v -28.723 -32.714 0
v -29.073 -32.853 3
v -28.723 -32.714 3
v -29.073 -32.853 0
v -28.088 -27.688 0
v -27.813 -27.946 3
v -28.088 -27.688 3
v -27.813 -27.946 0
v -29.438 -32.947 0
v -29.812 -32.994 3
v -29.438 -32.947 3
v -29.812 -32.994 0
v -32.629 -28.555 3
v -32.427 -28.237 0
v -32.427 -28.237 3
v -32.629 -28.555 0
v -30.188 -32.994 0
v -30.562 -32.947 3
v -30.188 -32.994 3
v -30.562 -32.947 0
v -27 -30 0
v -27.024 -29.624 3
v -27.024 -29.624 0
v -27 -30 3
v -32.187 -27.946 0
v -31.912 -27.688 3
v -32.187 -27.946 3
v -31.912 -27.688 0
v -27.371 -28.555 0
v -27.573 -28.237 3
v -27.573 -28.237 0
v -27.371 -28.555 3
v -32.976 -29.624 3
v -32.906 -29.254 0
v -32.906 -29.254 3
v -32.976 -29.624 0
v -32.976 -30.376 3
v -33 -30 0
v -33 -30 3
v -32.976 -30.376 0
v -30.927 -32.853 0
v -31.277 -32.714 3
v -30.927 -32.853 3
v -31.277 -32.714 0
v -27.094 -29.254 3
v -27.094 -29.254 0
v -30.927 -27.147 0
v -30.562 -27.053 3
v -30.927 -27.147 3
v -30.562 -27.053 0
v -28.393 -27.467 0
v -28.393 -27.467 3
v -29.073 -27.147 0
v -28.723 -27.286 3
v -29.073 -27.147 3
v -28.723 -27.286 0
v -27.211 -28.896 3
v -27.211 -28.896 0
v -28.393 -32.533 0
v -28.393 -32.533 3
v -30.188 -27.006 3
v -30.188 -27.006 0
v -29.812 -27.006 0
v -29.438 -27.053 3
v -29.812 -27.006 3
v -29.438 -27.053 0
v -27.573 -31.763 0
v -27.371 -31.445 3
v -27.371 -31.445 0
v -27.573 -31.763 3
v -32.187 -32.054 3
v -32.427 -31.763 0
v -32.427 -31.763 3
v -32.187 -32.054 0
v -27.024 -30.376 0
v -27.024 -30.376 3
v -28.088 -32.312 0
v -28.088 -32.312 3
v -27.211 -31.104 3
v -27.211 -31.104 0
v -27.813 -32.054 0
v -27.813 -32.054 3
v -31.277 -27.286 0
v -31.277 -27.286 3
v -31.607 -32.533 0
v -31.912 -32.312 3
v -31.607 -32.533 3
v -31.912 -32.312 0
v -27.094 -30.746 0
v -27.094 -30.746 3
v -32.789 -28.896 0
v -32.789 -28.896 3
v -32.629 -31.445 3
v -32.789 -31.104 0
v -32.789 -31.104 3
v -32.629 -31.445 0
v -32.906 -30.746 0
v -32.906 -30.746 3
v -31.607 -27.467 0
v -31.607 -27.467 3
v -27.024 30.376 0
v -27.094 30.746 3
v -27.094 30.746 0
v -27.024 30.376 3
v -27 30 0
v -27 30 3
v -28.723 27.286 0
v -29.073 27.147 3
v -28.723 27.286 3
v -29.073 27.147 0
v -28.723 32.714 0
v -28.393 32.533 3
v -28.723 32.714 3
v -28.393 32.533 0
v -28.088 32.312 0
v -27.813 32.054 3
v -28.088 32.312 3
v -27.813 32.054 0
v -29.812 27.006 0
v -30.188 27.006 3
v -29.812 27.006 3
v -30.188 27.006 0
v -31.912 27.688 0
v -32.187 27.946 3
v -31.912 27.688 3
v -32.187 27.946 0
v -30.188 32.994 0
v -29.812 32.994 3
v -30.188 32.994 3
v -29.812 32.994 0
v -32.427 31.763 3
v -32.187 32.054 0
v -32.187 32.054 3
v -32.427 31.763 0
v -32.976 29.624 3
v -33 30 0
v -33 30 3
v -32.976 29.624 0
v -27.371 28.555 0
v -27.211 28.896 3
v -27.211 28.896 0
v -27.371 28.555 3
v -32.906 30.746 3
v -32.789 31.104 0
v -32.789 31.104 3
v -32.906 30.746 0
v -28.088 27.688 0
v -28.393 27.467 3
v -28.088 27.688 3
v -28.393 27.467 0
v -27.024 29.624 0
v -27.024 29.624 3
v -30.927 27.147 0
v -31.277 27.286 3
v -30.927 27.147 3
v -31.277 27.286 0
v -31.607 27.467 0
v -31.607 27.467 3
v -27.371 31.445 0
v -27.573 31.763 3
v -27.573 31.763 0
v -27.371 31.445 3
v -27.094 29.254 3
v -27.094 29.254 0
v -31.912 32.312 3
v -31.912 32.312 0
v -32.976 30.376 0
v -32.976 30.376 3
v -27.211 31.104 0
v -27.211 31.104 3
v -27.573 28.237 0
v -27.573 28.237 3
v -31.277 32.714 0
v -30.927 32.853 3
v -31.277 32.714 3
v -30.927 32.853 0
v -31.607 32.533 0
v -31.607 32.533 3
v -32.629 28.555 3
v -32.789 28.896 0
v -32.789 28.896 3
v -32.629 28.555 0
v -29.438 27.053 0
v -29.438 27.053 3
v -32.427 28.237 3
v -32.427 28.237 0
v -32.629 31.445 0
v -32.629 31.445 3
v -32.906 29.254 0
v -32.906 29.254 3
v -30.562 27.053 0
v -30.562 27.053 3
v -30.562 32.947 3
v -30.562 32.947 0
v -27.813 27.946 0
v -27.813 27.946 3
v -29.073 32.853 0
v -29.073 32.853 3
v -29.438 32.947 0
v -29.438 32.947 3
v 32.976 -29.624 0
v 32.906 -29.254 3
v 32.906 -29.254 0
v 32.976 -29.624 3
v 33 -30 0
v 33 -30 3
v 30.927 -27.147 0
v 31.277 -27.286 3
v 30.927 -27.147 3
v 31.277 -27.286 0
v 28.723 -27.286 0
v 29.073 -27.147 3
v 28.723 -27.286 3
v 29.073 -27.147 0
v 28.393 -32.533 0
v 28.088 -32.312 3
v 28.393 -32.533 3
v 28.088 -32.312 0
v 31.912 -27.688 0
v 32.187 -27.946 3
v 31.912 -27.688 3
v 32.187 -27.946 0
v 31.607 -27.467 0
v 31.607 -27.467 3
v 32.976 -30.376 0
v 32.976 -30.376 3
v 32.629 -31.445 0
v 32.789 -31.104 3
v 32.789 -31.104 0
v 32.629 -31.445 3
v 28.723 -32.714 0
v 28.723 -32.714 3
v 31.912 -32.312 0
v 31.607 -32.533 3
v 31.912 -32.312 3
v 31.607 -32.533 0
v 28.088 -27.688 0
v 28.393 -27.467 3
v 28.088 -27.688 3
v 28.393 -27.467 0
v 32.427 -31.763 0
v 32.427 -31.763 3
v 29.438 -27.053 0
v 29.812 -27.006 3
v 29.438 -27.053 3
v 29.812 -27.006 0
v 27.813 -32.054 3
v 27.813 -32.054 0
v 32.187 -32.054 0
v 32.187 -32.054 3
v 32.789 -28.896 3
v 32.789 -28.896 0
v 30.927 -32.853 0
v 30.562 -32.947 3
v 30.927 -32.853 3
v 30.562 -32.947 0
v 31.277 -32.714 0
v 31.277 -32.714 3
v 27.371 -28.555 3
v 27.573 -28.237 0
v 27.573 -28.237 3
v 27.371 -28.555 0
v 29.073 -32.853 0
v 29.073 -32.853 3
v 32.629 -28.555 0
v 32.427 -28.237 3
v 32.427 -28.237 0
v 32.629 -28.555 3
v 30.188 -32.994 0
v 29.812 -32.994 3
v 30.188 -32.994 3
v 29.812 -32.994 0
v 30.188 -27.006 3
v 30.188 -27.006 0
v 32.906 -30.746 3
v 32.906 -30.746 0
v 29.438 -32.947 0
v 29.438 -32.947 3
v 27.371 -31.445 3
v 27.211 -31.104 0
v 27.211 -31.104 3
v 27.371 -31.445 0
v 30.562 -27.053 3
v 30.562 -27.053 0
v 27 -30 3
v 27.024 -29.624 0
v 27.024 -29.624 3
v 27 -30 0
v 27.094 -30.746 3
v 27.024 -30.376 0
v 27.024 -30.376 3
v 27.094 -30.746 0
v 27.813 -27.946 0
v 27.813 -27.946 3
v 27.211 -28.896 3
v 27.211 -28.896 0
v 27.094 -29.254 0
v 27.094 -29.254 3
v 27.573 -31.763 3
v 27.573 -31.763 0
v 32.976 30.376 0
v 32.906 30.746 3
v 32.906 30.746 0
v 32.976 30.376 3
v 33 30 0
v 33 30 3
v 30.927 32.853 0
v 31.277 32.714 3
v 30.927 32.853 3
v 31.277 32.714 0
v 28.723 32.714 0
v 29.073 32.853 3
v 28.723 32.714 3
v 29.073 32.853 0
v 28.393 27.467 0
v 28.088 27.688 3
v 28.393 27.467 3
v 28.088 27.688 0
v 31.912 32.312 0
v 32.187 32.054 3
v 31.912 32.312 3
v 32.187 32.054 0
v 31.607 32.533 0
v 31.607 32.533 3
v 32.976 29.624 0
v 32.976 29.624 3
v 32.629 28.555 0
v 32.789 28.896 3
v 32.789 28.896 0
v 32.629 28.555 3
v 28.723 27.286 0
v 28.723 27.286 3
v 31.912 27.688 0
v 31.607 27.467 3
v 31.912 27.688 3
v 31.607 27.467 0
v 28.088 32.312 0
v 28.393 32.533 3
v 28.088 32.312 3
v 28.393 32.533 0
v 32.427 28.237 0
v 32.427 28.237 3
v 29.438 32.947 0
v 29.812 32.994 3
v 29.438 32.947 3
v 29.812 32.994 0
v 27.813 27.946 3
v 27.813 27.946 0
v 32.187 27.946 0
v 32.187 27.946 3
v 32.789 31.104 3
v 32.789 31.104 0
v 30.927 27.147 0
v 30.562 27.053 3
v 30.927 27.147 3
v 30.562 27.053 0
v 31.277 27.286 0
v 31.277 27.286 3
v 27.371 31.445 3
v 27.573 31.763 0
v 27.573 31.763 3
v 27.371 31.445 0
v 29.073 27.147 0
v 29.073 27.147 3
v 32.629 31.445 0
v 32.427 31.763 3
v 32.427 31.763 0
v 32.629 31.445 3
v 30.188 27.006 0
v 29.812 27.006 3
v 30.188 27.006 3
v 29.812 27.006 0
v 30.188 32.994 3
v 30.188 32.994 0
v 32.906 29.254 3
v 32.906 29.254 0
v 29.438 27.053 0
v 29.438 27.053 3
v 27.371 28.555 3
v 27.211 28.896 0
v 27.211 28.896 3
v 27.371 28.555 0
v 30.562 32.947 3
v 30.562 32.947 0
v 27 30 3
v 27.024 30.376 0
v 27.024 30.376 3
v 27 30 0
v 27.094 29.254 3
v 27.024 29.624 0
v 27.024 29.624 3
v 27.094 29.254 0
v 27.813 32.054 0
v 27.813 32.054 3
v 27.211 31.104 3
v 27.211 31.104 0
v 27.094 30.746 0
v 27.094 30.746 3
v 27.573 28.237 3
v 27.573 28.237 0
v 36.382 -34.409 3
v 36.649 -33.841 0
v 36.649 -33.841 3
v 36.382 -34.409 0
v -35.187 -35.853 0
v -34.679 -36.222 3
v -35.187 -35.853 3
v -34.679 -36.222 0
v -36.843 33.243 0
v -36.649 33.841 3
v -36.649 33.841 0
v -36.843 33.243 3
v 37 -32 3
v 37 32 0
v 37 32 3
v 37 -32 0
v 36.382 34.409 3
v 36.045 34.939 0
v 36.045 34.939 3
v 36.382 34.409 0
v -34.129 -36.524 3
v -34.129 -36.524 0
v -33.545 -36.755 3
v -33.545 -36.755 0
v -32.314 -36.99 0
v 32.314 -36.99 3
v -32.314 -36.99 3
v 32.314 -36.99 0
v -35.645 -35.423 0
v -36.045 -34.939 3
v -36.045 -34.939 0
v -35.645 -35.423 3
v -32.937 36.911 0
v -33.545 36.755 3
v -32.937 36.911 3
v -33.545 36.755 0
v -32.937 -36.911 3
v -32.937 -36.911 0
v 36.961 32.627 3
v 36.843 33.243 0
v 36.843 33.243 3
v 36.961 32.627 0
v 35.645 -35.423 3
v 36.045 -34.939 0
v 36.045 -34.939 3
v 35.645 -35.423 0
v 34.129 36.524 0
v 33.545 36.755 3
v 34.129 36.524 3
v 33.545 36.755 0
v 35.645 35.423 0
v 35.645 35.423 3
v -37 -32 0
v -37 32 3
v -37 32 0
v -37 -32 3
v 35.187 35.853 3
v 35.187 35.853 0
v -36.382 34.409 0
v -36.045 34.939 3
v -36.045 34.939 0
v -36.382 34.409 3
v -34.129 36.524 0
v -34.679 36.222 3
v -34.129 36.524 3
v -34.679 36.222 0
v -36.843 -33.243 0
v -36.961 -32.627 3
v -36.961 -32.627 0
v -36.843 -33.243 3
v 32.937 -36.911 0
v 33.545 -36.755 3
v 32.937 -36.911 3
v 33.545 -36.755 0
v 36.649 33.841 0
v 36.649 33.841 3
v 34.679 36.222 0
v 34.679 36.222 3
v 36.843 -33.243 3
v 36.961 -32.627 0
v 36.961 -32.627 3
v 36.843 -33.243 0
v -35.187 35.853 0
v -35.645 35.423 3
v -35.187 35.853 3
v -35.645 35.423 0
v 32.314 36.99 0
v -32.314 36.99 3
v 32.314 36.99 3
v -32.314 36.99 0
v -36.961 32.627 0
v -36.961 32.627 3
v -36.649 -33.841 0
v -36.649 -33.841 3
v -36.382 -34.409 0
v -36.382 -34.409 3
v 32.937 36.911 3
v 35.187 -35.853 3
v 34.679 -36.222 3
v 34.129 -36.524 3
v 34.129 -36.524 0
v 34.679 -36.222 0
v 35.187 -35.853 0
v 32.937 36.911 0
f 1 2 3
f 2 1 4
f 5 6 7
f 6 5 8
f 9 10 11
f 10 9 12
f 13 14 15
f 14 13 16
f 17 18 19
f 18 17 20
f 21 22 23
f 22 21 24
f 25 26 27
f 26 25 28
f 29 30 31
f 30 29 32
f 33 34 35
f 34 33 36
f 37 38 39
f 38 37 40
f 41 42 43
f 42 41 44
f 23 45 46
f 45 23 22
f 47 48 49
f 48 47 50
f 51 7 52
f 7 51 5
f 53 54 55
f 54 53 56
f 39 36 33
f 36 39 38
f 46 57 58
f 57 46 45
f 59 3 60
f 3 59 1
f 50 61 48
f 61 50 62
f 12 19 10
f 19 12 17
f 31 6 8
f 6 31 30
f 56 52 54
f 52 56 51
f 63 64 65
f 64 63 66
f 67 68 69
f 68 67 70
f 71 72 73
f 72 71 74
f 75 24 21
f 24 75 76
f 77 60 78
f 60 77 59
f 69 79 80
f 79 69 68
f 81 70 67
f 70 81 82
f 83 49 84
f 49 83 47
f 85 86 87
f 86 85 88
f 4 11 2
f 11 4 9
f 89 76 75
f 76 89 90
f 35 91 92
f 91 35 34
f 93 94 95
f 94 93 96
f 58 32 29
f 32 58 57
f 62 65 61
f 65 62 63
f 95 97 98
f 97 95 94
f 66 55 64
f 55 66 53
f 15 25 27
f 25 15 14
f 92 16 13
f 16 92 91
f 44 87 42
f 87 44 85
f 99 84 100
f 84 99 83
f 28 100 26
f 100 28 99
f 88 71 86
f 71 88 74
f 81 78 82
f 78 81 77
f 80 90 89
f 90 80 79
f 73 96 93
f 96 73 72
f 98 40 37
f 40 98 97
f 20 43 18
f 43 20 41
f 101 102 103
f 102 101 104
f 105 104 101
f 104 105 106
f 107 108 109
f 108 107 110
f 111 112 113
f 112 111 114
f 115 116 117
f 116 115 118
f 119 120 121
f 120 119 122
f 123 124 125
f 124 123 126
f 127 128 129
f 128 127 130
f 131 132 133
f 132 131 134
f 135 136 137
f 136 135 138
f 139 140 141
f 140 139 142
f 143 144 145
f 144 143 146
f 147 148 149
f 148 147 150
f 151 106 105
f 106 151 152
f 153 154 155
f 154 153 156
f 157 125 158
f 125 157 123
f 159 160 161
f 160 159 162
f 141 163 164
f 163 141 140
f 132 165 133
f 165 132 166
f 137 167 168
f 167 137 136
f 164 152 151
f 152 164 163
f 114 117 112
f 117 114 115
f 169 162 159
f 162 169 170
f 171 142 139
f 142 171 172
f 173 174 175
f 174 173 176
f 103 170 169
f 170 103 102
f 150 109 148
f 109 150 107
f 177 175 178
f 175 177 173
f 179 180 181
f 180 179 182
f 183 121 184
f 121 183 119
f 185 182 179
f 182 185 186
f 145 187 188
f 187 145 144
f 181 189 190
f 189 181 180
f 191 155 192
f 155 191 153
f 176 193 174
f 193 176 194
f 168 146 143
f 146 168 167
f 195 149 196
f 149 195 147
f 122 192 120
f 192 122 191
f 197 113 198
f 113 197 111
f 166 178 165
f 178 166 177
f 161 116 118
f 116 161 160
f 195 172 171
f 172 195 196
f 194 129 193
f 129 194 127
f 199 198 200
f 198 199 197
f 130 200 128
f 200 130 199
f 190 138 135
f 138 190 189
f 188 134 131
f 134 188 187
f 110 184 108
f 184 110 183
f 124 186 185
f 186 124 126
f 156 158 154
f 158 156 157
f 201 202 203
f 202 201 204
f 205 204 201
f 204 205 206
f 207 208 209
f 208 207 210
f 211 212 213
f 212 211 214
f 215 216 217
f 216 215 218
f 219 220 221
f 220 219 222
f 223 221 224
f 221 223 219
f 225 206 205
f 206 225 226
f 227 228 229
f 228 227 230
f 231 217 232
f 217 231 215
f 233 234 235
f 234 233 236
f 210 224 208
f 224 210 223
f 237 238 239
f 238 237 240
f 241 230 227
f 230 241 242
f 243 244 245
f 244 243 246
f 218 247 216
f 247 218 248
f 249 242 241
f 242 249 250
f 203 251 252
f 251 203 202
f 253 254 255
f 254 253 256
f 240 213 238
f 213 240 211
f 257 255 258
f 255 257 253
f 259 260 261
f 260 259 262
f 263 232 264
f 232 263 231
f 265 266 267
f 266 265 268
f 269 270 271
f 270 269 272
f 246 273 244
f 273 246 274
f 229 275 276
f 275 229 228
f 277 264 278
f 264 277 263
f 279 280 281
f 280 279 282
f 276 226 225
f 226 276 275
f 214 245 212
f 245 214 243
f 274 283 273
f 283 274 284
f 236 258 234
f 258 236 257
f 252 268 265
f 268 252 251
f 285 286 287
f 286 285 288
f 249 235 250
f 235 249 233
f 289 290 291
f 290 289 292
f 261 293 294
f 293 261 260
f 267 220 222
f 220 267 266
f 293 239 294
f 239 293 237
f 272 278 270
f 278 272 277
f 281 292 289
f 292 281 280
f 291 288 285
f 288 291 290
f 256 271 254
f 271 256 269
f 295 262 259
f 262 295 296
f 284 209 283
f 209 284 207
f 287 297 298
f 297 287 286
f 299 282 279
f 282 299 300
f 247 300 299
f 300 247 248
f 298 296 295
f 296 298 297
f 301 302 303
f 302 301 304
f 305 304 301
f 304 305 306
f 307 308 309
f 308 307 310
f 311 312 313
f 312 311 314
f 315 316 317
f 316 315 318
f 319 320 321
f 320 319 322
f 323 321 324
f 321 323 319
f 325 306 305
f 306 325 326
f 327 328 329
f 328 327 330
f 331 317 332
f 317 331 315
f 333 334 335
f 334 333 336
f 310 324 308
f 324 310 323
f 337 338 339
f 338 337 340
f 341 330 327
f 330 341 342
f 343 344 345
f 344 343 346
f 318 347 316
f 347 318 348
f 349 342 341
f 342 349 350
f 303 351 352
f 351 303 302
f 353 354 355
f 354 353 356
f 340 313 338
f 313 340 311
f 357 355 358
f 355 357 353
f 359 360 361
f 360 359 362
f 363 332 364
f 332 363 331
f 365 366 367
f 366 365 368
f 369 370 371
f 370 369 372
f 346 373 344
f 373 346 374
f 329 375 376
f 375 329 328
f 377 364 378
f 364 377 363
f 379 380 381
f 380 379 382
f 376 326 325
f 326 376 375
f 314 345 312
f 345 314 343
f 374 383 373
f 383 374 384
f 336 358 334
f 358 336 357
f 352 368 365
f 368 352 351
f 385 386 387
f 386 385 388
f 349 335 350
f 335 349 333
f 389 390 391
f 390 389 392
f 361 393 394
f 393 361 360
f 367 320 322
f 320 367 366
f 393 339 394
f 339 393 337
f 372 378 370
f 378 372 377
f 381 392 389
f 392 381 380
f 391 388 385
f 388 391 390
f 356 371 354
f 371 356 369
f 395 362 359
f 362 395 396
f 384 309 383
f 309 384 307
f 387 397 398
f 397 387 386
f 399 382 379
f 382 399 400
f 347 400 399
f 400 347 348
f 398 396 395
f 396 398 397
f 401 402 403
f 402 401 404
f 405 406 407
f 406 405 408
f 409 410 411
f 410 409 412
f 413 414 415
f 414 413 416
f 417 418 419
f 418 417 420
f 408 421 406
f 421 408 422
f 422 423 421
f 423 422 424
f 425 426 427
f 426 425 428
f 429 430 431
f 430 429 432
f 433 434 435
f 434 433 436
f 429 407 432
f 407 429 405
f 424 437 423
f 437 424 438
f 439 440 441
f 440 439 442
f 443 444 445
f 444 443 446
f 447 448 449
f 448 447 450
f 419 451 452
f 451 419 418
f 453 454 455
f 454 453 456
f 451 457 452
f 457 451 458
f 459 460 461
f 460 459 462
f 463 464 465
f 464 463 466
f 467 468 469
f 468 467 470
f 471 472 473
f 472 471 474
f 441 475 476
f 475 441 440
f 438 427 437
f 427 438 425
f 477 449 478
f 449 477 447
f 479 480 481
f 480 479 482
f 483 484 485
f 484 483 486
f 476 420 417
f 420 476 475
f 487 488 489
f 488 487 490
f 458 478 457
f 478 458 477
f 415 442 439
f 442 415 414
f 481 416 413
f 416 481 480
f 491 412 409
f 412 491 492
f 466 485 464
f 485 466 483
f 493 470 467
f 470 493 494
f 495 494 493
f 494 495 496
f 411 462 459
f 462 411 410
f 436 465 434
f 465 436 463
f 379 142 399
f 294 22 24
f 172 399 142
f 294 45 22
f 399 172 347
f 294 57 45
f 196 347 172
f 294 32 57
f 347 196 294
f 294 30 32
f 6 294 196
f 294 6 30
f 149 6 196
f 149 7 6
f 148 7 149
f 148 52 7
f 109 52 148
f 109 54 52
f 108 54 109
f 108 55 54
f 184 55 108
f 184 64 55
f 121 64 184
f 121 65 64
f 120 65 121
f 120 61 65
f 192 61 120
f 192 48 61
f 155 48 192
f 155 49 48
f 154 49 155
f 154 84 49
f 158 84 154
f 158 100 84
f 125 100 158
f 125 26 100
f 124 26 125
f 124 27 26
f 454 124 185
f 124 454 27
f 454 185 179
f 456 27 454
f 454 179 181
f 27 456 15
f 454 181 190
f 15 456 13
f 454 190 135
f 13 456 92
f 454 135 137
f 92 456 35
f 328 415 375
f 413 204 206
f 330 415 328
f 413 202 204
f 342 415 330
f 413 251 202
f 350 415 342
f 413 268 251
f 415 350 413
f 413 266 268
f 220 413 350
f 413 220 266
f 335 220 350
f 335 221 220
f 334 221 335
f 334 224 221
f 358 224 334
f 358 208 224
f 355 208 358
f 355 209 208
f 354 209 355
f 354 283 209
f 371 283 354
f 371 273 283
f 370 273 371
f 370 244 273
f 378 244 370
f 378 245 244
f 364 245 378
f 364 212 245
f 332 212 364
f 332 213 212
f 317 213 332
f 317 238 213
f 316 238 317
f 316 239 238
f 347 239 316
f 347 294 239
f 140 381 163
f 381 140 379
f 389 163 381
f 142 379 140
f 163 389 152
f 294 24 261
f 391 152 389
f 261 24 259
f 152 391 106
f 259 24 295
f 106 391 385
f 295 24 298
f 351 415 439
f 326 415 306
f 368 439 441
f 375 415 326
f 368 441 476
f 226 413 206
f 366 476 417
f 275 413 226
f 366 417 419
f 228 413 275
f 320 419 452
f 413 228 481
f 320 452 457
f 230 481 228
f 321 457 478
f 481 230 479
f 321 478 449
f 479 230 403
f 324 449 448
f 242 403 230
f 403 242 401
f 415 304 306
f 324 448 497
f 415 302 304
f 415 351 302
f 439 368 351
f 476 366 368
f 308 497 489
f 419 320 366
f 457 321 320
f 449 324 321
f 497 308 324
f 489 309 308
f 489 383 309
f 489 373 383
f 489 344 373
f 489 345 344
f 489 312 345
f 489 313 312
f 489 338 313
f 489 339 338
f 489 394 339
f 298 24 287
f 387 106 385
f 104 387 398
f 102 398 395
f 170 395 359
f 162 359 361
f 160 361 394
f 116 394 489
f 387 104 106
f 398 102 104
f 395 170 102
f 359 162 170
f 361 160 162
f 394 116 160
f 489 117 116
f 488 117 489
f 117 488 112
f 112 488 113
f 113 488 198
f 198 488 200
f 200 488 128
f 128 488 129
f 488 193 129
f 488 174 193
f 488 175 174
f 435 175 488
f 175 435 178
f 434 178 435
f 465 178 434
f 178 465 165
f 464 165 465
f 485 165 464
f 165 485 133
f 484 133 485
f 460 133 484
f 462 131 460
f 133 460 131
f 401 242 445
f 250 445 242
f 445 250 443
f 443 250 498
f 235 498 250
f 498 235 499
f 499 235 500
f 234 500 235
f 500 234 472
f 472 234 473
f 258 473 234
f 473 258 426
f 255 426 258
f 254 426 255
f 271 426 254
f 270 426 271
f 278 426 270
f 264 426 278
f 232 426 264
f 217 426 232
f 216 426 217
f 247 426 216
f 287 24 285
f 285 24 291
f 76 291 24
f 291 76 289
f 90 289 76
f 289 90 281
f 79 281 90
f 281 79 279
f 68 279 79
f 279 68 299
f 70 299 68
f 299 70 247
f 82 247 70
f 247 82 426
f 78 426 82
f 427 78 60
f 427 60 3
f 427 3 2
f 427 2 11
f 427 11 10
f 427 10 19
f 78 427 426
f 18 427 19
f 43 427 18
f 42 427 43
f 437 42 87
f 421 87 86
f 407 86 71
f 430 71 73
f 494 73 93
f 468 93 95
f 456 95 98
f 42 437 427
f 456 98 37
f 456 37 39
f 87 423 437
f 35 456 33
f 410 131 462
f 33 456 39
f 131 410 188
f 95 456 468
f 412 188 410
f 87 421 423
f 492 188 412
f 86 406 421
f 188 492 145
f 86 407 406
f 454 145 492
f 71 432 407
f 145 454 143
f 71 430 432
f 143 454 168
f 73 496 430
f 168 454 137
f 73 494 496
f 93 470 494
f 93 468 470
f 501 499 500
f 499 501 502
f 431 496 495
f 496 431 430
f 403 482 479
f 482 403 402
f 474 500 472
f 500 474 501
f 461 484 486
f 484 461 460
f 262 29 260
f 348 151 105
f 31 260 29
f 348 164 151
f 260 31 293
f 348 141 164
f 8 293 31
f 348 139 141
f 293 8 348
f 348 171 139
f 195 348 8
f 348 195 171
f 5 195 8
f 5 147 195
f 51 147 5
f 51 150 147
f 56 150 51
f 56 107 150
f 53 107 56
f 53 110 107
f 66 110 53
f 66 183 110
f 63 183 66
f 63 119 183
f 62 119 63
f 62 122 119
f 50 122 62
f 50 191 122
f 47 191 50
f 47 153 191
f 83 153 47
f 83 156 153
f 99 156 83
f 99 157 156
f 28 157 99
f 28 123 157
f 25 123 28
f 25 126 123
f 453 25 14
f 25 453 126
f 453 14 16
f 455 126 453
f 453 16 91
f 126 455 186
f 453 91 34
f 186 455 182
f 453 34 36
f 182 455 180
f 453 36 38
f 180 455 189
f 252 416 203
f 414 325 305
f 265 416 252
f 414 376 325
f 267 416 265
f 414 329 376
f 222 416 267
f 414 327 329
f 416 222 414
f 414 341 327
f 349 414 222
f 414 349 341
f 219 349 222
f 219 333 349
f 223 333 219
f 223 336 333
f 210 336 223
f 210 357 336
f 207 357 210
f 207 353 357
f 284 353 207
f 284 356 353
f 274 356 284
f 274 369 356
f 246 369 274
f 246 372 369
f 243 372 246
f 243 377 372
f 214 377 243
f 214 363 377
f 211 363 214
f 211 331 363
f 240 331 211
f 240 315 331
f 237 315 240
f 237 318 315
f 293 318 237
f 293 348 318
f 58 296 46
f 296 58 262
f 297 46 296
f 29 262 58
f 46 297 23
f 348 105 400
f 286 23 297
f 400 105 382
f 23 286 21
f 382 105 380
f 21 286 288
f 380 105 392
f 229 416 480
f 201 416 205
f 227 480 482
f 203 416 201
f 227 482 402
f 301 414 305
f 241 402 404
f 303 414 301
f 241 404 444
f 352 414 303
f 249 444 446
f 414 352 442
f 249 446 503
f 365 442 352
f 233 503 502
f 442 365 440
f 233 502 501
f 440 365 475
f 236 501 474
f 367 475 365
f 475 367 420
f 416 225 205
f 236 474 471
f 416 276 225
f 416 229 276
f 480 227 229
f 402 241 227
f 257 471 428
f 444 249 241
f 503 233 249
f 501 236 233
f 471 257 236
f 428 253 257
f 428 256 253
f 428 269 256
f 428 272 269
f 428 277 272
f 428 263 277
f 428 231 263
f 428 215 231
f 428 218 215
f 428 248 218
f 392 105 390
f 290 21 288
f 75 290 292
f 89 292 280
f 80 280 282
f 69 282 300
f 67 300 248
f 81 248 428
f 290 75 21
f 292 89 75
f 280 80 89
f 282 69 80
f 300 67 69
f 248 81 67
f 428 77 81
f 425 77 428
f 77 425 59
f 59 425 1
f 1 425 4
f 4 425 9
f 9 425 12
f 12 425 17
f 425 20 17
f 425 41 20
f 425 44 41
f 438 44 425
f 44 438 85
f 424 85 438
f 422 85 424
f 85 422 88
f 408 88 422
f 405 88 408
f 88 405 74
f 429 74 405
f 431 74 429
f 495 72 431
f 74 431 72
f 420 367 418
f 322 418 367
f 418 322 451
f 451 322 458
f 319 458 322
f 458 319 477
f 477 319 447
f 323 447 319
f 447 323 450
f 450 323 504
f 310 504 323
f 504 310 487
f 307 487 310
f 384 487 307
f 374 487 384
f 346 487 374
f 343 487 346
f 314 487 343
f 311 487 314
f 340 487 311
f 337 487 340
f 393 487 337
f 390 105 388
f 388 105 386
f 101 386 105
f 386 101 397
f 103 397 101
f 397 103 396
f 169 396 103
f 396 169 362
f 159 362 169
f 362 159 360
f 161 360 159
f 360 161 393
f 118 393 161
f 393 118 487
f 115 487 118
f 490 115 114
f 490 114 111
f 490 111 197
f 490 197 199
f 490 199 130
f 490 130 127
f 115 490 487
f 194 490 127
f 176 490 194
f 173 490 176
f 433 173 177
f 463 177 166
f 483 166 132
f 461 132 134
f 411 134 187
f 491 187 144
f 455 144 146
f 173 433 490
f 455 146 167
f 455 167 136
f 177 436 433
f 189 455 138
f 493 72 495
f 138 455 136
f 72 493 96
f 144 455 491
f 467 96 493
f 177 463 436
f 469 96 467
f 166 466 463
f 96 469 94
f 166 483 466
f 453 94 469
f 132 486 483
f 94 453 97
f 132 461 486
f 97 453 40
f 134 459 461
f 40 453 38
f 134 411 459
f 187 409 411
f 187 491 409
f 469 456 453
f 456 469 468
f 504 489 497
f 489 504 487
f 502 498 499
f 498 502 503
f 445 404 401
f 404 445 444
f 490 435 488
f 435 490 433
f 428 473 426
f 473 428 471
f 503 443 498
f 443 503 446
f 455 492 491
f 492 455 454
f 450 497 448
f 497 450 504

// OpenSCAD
$fn = 50;


difference() {
	union() {
		hull() {
			translate(v = [-32.0000000000, 32.0000000000, 0]) {
				cylinder(h = 3, r = 5);
			}
			translate(v = [32.0000000000, 32.0000000000, 0]) {
				cylinder(h = 3, r = 5);
			}
			translate(v = [-32.0000000000, -32.0000000000, 0]) {
				cylinder(h = 3, r = 5);
			}
			translate(v = [32.0000000000, -32.0000000000, 0]) {
				cylinder(h = 3, r = 5);
			}
		}
	}
	union() {
		translate(v = [-30.0000000000, -30.0000000000, -100.0000000000]) {
			cylinder(h = 200, r = 3.0000000000);
		}
		translate(v = [-30.0000000000, 30.0000000000, -100.0000000000]) {
			cylinder(h = 200, r = 3.0000000000);
		}
		translate(v = [30.0000000000, -30.0000000000, -100.0000000000]) {
			cylinder(h = 200, r = 3.0000000000);
		}
		translate(v = [30.0000000000, 30.0000000000, -100.0000000000]) {
			cylinder(h = 200, r = 3.0000000000);
		}
	}
}
